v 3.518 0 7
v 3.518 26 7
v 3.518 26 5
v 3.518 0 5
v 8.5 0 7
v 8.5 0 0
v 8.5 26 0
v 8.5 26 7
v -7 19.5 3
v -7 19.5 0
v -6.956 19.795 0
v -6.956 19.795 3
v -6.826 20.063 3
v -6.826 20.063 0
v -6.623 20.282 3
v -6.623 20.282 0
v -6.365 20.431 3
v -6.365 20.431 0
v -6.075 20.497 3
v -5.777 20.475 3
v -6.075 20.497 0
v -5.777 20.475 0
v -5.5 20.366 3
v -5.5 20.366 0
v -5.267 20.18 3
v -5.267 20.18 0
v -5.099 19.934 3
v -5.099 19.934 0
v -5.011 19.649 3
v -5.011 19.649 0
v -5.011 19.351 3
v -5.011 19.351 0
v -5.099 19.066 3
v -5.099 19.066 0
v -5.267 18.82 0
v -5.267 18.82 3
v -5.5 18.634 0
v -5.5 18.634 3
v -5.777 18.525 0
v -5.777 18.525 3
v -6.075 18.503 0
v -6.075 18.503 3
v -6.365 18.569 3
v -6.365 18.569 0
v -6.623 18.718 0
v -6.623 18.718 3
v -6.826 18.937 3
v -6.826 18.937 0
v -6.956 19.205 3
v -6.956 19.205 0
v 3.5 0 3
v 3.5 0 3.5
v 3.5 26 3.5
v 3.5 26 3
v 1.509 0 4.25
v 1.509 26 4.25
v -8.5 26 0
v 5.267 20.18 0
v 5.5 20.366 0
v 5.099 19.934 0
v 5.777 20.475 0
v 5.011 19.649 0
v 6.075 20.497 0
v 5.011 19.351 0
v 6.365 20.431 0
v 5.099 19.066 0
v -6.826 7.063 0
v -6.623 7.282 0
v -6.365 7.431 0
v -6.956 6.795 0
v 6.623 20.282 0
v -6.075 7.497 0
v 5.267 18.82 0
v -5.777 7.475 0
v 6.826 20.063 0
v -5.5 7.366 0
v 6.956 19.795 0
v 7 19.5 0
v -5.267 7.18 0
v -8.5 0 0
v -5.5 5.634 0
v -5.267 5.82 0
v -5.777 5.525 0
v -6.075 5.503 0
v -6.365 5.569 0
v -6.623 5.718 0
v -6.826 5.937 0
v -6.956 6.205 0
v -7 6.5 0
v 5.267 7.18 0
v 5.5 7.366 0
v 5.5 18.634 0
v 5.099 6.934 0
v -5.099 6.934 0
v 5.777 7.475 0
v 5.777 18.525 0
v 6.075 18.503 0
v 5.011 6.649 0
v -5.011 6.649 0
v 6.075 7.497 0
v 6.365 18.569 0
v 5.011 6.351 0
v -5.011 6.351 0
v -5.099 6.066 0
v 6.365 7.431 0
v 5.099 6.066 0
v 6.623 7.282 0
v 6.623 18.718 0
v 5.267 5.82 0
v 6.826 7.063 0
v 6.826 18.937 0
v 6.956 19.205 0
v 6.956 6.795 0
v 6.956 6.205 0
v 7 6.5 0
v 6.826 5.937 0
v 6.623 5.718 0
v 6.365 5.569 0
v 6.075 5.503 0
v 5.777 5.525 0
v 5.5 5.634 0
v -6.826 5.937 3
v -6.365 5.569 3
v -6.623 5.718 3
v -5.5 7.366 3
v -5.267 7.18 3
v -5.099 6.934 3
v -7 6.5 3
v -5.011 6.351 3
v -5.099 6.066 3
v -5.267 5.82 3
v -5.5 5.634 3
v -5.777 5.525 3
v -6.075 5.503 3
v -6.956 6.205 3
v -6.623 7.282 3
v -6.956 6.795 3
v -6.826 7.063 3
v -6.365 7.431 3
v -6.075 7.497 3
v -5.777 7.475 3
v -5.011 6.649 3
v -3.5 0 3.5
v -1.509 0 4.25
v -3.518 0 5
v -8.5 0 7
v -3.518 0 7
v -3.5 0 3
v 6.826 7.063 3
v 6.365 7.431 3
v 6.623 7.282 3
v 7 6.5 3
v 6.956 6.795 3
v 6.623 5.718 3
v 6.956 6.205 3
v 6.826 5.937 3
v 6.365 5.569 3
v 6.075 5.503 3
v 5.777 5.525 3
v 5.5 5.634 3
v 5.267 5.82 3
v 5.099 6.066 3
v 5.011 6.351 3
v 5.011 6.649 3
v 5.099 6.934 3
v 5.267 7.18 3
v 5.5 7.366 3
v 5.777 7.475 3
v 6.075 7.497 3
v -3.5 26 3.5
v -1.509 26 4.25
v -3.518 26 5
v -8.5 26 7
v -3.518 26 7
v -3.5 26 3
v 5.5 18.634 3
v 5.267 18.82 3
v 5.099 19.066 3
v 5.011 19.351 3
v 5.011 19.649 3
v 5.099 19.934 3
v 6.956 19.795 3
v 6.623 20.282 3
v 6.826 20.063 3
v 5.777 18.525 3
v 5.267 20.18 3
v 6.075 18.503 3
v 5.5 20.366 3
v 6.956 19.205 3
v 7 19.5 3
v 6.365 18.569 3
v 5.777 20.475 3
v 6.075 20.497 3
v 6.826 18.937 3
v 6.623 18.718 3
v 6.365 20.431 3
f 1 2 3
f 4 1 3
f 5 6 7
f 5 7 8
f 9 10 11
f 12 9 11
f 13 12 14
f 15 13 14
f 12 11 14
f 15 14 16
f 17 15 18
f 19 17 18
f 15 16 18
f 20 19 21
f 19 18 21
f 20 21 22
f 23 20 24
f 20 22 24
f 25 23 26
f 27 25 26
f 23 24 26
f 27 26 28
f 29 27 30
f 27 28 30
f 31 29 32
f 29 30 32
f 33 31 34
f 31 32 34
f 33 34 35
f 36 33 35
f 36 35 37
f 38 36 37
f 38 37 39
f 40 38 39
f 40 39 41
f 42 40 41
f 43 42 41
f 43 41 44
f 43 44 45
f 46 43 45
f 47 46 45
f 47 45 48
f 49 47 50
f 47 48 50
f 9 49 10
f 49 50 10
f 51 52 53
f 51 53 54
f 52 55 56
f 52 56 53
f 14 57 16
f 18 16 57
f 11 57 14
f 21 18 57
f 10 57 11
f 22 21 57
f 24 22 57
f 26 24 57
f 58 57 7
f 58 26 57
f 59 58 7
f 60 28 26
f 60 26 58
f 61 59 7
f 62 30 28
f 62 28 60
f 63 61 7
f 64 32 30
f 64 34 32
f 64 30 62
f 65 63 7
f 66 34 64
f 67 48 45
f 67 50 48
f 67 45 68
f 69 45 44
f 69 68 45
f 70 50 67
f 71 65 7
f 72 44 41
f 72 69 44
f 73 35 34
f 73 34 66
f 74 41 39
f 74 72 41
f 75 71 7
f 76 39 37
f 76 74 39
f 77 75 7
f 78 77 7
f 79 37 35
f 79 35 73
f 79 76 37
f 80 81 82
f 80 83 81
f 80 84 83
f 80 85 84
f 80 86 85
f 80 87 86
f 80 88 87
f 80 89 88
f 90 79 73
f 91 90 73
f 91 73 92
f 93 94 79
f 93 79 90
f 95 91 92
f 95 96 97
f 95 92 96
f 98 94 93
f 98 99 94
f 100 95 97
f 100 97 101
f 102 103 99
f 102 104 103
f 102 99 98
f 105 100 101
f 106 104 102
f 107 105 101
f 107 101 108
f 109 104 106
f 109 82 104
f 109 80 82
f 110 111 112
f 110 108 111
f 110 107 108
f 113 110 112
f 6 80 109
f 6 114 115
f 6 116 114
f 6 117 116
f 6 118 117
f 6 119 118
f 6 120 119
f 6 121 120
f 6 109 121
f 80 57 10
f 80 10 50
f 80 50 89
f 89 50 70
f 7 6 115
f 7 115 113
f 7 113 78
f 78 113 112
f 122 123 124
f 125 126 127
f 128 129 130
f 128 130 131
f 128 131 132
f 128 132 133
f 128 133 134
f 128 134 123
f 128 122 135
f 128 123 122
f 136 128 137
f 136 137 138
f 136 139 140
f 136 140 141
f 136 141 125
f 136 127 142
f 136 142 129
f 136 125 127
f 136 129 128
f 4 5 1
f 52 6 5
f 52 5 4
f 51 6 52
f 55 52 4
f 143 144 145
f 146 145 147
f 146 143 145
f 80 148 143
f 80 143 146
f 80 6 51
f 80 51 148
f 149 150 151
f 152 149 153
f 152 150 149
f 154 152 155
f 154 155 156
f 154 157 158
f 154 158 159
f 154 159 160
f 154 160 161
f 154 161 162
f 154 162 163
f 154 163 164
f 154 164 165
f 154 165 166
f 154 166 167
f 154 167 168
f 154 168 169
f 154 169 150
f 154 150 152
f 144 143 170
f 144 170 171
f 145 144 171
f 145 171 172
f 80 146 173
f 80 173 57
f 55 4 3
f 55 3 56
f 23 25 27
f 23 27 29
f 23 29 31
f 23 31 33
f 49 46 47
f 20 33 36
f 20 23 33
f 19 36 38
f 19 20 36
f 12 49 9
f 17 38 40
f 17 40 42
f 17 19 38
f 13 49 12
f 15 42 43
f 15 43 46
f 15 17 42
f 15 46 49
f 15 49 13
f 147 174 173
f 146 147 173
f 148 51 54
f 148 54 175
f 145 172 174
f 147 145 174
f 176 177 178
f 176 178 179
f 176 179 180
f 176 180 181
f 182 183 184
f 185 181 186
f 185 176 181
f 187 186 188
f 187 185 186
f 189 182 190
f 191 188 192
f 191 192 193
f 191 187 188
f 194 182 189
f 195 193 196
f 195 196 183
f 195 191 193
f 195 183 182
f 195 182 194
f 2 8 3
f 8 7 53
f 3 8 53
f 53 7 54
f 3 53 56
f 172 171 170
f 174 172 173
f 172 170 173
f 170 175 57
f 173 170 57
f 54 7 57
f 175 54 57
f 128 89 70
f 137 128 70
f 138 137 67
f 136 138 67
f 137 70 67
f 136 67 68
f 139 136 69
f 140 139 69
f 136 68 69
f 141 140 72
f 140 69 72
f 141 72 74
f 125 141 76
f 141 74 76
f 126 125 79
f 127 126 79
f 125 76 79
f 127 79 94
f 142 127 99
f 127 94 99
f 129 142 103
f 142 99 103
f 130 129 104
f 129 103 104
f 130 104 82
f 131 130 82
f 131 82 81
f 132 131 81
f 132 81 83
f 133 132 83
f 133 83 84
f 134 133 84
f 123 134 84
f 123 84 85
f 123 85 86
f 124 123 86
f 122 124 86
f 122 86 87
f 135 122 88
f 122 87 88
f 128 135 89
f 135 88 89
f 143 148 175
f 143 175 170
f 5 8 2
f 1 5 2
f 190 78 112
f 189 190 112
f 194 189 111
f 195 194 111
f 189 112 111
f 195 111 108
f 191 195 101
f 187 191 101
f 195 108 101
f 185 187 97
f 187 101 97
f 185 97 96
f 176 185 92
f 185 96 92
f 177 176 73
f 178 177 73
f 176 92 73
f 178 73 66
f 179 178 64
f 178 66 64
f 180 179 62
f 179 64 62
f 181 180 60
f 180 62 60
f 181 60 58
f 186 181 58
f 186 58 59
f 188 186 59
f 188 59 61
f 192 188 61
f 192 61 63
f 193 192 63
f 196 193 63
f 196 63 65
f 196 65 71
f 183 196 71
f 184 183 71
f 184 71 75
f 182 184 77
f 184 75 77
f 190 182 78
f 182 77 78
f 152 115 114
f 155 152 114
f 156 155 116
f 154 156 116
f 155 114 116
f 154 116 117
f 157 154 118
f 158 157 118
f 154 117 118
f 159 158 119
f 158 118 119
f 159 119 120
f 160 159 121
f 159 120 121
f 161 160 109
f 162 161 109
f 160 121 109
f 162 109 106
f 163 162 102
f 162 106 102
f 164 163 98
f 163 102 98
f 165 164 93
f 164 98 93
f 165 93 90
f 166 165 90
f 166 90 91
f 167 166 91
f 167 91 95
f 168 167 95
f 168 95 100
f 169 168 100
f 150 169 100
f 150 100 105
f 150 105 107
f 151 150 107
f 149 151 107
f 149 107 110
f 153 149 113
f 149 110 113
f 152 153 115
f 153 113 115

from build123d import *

# Parameters (mm, degrees)
EXTRUDE_1_DEPTH     = 26
SKETCH_2_R          = 1
CUT_EXTRUDE_1_DEPTH = 3


with BuildPart() as part:
    # 草图1 → 凸台-拉伸1 (new body)
    with BuildSketch(Plane(origin=(0, 0, 0), x_dir=(1, 0, 0), z_dir=(0, 1, 0))):
        Polygon((-8.5, 0), (8.5, 0), (8.5, -7), (3.517553147, -7), (3.517553147, -5), (1.508639639, -4.25), (3.5, -3.5), (3.5, -3), (-3.5, -3), (-3.5, -3.5), (-1.508639639, -4.25), (-3.517553147, -5), (-3.517553147, -7), (-8.5, -7), align=None)
    extrude(amount=EXTRUDE_1_DEPTH)

    # 草图2 → 切除-拉伸1 (cut)
    with BuildSketch(Plane(origin=(0, 0, 0), x_dir=(-1, 0, 0), z_dir=(0, 0, -1))):
        with Locations((6, 19.5)):
            Circle(SKETCH_2_R)
        with Locations((6, 6.5)):
            Circle(SKETCH_2_R)
        with Locations(Location((-6, 6.5, 0), (0, 0, 180))):
            Circle(SKETCH_2_R)
        with Locations(Location((-6, 19.5, 0), (0, 0, 180))):
            Circle(SKETCH_2_R)
    extrude(amount=-CUT_EXTRUDE_1_DEPTH, mode=Mode.SUBTRACT)


solid = part.part
